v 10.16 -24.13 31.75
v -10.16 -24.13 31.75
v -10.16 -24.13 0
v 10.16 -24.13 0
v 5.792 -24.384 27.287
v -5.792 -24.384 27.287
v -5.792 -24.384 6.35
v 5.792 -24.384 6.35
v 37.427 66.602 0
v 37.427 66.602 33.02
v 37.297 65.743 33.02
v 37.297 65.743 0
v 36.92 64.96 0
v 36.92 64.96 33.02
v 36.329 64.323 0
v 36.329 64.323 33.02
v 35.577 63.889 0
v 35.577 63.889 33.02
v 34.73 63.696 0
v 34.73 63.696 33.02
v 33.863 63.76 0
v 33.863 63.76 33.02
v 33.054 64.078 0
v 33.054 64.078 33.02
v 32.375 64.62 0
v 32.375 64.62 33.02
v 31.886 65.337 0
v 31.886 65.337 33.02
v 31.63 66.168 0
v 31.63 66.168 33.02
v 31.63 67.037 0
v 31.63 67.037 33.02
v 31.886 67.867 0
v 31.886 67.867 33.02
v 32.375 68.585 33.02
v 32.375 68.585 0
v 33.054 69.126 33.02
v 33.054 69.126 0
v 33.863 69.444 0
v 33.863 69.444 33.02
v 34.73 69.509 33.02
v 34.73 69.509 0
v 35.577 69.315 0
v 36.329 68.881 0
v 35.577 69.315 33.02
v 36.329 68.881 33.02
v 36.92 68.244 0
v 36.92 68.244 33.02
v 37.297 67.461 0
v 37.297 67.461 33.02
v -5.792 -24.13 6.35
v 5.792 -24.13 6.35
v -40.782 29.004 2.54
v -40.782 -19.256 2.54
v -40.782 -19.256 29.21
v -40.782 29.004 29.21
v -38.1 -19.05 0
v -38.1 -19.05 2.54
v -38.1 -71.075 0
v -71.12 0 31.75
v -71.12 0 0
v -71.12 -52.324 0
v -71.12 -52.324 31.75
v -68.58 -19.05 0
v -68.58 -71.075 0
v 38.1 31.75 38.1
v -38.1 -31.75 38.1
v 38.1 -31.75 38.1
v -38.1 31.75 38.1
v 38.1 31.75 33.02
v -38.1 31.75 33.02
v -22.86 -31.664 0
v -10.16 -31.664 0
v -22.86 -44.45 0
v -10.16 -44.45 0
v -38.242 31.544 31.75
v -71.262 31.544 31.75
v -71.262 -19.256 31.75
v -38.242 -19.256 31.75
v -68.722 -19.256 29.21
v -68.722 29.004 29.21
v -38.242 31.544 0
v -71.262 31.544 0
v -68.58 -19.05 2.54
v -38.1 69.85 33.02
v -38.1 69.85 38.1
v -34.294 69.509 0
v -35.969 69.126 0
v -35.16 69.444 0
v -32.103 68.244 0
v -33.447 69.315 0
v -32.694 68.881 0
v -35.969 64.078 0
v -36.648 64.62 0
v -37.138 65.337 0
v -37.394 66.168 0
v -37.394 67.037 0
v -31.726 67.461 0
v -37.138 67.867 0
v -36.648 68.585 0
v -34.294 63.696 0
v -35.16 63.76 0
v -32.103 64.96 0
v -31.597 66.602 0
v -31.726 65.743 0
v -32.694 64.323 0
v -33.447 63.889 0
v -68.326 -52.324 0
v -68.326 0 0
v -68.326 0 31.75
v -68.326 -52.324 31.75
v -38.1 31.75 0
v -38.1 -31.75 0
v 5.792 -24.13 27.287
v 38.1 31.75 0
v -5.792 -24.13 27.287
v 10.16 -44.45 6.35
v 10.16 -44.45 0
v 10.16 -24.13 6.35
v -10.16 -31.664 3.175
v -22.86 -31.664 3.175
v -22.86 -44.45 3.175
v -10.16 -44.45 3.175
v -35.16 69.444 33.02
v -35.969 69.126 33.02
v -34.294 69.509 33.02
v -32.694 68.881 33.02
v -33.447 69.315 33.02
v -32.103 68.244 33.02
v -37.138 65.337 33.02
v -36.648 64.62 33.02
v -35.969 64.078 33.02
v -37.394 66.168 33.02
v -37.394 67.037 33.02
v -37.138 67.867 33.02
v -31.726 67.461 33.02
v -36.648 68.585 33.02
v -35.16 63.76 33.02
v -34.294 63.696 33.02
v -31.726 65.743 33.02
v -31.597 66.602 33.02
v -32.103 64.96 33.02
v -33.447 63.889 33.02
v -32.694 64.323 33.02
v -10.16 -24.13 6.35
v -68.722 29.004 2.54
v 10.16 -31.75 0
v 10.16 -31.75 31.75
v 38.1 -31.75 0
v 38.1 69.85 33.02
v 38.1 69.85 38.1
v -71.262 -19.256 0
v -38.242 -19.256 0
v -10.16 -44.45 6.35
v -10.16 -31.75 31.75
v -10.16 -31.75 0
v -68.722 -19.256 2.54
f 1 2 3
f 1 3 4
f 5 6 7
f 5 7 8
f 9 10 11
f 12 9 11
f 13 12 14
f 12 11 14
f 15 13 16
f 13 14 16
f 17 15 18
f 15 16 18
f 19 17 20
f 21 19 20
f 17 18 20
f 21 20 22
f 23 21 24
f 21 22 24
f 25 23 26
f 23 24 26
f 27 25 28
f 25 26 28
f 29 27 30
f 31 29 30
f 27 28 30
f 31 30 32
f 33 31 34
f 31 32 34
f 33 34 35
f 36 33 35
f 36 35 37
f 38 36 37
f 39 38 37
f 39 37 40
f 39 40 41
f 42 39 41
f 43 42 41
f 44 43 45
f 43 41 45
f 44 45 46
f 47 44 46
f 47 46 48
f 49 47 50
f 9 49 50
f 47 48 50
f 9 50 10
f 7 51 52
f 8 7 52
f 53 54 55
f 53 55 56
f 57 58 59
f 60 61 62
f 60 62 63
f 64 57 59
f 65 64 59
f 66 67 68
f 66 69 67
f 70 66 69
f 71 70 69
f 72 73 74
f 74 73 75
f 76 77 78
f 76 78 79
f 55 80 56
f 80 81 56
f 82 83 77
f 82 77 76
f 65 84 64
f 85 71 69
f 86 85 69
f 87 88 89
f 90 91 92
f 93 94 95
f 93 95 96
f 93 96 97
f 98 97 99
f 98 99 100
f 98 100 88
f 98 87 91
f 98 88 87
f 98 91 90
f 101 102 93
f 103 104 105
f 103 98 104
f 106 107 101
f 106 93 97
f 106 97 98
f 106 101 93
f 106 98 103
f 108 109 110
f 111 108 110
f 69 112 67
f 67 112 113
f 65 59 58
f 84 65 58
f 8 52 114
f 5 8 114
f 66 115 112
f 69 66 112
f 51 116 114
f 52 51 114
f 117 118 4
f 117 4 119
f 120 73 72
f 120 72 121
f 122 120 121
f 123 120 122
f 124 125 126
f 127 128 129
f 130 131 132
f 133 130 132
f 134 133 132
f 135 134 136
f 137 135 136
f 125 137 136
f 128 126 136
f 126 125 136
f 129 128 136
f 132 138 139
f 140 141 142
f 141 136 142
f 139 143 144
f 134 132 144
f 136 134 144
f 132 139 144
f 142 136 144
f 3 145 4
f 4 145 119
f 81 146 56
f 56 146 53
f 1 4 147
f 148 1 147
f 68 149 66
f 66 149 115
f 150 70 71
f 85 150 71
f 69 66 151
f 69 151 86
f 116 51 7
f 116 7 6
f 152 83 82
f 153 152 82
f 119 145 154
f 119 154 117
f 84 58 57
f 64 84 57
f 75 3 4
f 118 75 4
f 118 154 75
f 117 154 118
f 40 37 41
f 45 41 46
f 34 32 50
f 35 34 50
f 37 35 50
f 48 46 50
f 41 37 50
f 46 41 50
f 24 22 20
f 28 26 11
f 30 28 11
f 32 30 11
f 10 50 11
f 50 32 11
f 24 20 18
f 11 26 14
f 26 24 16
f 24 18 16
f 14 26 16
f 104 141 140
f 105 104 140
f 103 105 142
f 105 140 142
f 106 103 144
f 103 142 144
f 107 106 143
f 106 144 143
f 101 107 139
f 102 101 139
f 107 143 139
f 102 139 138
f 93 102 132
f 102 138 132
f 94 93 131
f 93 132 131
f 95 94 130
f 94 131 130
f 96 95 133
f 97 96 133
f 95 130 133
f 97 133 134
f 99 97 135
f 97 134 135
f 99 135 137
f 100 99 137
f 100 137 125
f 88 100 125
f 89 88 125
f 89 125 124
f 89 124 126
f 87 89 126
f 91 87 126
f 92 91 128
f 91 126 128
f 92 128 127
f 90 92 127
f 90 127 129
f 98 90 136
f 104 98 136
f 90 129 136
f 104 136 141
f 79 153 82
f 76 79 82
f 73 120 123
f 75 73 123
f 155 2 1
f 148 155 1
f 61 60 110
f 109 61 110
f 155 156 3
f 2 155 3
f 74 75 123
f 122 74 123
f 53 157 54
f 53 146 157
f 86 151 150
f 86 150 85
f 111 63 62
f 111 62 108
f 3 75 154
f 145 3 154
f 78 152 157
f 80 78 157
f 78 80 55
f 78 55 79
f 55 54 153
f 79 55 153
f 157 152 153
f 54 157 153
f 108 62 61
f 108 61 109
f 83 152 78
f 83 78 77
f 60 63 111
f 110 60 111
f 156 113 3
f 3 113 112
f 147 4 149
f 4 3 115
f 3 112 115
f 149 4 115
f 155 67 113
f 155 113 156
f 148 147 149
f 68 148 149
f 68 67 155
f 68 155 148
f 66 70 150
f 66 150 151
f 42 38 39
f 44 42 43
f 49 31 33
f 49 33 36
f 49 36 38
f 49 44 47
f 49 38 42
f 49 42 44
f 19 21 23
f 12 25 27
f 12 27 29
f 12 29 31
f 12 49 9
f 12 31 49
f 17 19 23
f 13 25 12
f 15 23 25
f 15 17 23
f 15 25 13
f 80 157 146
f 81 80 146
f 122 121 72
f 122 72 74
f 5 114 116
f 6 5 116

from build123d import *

# Parameters (mm, degrees)
F1_DEPTH  = 38.1
F2_W      = 76.2
F2_H      = 5.08
F3_DEPTH  = 38.1
F5_W      = 20.32
F5_H      = 6.35
F6_DEPTH  = 7.62
F8_W      = 2.794
F8_H      = 31.75
F9_DEPTH  = 52.324
F10_DEPTH = 20.32
F11_W     = 12.7857104659
F11_H     = 3.175
F12_DEPTH = 12.7
F13_W     = 5.791861964
F13_H     = 20.9366468877
F14_DEPTH = 0.254
F15_W     = 33.02
F15_H     = 50.8
F16_DEPTH = 31.75
F17_DEPTH = 30.48
F18_T     = -2.54
F19_R     = 2.9147550464
F20_DEPTH = 33.02


with BuildPart() as f1:
    # F0 (on Top) → F1 (new body)
    with BuildSketch(Plane.XY):
        Polygon((-38.1, -31.75), (-10.16, -31.75), (-10.16, -24.13), (10.16, -24.13), (10.16, -31.75), (38.1, -31.75), (38.1, 31.75), (-38.1, 31.75), (-38.1, -19.05), align=None)
    extrude(amount=F1_DEPTH)

    # F5 (on face) → F6 (join)
    with BuildSketch(Plane.XZ.offset(24.13)):
        with Locations((0, 34.925)):
            Rectangle(F5_W, F5_H)
    extrude(amount=F6_DEPTH)


with BuildPart() as f3:
    # F2 (on face) → F3 (new body)
    with BuildSketch(Plane(origin=(0, 31.75, 0), x_dir=(-1, 0, 0), z_dir=(0, 1, 0))):
        with Locations((0, 35.56)):
            Rectangle(F2_W, F2_H)
    extrude(amount=F3_DEPTH)


with BuildPart() as f9:
    # F8 (on Front) → F9 (new body)
    with BuildSketch(Plane.XZ):
        with Locations((-69.723, 15.875)):
            Rectangle(F8_W, F8_H)
    extrude(amount=F9_DEPTH)


with BuildPart() as f10:
    # F5 (on face) → F10 (new body)
    with BuildSketch(Plane.XZ.offset(24.13)):
        with Locations((0, 3.175)):
            Rectangle(F5_W, F5_H)
    extrude(amount=F10_DEPTH)


with BuildPart() as f12:
    # F11 (on face) → F12 (new body)
    with BuildSketch(Plane(origin=(-10.16, 0, 0), x_dir=(0, -1, 0), z_dir=(-1, 0, 0))):
        with Locations((38.057144767, 1.5875)):
            Rectangle(F11_W, F11_H)
    extrude(amount=F12_DEPTH)


with BuildPart() as f14:
    # F13 (on face) → F14 (new body)
    with BuildSketch(Plane.XZ.offset(24.13)):
        with Locations((2.895930982, 16.8183234438)):
            Rectangle(F13_W, F13_H)
        with Locations((-2.895930982, 16.8183234438)):
            Rectangle(F13_W, F13_H)
    extrude(amount=F14_DEPTH)


with BuildPart() as f16:
    # F15 (on Top) → F16 (new body)
    with BuildSketch(Plane.XY):
        with Locations((-54.7516793013, 6.1444475591)):
            Rectangle(F15_W, F15_H)
    extrude(amount=F16_DEPTH)

    # F18
    f18_openings = [f16.faces().sort_by_distance(p)[0] for p in [
        (-54.751679, -19.255552, 15.875),
    ]]
    offset(amount=F18_T, openings=f18_openings)


with BuildPart() as f17:
    # F7 (on face) → F17 (new body)
    with BuildSketch(Plane(origin=(-38.1, 0, 0), x_dir=(0, -1, 0), z_dir=(-1, 0, 0))):
        Polygon((31.75, 1.9199459951), (19.05, 2.54), (19.05, 0), (31.75, 0), align=None)
        Polygon((71.07450068, 0), (31.75, 1.9199459951), (31.75, 0), align=None)
    extrude(amount=F17_DEPTH)


with BuildPart() as f20:
    # F19 (on face) → F20 (new body)
    with BuildSketch(Plane(origin=(0, 0, 33.02), x_dir=(1, 0, 0), z_dir=(0, 0, -1))):
        with Locations((34.5117524266, -66.6021332145)):
            Circle(F19_R)
    extrude(amount=F20_DEPTH)


with BuildPart() as f20b:
    # F19 (on face) → F20, piece 2 (new body)
    with BuildSketch(Plane(origin=(0, 0, 33.02), x_dir=(1, 0, 0), z_dir=(0, 0, -1))):
        with Locations((-34.5117524266, -66.6021332145)):
            Circle(F19_R)
    extrude(amount=F20_DEPTH)


solid = Compound([f1.part, f3.part, f9.part, f10.part, f12.part, f14.part, f16.part, f17.part, f20.part, f20b.part])
